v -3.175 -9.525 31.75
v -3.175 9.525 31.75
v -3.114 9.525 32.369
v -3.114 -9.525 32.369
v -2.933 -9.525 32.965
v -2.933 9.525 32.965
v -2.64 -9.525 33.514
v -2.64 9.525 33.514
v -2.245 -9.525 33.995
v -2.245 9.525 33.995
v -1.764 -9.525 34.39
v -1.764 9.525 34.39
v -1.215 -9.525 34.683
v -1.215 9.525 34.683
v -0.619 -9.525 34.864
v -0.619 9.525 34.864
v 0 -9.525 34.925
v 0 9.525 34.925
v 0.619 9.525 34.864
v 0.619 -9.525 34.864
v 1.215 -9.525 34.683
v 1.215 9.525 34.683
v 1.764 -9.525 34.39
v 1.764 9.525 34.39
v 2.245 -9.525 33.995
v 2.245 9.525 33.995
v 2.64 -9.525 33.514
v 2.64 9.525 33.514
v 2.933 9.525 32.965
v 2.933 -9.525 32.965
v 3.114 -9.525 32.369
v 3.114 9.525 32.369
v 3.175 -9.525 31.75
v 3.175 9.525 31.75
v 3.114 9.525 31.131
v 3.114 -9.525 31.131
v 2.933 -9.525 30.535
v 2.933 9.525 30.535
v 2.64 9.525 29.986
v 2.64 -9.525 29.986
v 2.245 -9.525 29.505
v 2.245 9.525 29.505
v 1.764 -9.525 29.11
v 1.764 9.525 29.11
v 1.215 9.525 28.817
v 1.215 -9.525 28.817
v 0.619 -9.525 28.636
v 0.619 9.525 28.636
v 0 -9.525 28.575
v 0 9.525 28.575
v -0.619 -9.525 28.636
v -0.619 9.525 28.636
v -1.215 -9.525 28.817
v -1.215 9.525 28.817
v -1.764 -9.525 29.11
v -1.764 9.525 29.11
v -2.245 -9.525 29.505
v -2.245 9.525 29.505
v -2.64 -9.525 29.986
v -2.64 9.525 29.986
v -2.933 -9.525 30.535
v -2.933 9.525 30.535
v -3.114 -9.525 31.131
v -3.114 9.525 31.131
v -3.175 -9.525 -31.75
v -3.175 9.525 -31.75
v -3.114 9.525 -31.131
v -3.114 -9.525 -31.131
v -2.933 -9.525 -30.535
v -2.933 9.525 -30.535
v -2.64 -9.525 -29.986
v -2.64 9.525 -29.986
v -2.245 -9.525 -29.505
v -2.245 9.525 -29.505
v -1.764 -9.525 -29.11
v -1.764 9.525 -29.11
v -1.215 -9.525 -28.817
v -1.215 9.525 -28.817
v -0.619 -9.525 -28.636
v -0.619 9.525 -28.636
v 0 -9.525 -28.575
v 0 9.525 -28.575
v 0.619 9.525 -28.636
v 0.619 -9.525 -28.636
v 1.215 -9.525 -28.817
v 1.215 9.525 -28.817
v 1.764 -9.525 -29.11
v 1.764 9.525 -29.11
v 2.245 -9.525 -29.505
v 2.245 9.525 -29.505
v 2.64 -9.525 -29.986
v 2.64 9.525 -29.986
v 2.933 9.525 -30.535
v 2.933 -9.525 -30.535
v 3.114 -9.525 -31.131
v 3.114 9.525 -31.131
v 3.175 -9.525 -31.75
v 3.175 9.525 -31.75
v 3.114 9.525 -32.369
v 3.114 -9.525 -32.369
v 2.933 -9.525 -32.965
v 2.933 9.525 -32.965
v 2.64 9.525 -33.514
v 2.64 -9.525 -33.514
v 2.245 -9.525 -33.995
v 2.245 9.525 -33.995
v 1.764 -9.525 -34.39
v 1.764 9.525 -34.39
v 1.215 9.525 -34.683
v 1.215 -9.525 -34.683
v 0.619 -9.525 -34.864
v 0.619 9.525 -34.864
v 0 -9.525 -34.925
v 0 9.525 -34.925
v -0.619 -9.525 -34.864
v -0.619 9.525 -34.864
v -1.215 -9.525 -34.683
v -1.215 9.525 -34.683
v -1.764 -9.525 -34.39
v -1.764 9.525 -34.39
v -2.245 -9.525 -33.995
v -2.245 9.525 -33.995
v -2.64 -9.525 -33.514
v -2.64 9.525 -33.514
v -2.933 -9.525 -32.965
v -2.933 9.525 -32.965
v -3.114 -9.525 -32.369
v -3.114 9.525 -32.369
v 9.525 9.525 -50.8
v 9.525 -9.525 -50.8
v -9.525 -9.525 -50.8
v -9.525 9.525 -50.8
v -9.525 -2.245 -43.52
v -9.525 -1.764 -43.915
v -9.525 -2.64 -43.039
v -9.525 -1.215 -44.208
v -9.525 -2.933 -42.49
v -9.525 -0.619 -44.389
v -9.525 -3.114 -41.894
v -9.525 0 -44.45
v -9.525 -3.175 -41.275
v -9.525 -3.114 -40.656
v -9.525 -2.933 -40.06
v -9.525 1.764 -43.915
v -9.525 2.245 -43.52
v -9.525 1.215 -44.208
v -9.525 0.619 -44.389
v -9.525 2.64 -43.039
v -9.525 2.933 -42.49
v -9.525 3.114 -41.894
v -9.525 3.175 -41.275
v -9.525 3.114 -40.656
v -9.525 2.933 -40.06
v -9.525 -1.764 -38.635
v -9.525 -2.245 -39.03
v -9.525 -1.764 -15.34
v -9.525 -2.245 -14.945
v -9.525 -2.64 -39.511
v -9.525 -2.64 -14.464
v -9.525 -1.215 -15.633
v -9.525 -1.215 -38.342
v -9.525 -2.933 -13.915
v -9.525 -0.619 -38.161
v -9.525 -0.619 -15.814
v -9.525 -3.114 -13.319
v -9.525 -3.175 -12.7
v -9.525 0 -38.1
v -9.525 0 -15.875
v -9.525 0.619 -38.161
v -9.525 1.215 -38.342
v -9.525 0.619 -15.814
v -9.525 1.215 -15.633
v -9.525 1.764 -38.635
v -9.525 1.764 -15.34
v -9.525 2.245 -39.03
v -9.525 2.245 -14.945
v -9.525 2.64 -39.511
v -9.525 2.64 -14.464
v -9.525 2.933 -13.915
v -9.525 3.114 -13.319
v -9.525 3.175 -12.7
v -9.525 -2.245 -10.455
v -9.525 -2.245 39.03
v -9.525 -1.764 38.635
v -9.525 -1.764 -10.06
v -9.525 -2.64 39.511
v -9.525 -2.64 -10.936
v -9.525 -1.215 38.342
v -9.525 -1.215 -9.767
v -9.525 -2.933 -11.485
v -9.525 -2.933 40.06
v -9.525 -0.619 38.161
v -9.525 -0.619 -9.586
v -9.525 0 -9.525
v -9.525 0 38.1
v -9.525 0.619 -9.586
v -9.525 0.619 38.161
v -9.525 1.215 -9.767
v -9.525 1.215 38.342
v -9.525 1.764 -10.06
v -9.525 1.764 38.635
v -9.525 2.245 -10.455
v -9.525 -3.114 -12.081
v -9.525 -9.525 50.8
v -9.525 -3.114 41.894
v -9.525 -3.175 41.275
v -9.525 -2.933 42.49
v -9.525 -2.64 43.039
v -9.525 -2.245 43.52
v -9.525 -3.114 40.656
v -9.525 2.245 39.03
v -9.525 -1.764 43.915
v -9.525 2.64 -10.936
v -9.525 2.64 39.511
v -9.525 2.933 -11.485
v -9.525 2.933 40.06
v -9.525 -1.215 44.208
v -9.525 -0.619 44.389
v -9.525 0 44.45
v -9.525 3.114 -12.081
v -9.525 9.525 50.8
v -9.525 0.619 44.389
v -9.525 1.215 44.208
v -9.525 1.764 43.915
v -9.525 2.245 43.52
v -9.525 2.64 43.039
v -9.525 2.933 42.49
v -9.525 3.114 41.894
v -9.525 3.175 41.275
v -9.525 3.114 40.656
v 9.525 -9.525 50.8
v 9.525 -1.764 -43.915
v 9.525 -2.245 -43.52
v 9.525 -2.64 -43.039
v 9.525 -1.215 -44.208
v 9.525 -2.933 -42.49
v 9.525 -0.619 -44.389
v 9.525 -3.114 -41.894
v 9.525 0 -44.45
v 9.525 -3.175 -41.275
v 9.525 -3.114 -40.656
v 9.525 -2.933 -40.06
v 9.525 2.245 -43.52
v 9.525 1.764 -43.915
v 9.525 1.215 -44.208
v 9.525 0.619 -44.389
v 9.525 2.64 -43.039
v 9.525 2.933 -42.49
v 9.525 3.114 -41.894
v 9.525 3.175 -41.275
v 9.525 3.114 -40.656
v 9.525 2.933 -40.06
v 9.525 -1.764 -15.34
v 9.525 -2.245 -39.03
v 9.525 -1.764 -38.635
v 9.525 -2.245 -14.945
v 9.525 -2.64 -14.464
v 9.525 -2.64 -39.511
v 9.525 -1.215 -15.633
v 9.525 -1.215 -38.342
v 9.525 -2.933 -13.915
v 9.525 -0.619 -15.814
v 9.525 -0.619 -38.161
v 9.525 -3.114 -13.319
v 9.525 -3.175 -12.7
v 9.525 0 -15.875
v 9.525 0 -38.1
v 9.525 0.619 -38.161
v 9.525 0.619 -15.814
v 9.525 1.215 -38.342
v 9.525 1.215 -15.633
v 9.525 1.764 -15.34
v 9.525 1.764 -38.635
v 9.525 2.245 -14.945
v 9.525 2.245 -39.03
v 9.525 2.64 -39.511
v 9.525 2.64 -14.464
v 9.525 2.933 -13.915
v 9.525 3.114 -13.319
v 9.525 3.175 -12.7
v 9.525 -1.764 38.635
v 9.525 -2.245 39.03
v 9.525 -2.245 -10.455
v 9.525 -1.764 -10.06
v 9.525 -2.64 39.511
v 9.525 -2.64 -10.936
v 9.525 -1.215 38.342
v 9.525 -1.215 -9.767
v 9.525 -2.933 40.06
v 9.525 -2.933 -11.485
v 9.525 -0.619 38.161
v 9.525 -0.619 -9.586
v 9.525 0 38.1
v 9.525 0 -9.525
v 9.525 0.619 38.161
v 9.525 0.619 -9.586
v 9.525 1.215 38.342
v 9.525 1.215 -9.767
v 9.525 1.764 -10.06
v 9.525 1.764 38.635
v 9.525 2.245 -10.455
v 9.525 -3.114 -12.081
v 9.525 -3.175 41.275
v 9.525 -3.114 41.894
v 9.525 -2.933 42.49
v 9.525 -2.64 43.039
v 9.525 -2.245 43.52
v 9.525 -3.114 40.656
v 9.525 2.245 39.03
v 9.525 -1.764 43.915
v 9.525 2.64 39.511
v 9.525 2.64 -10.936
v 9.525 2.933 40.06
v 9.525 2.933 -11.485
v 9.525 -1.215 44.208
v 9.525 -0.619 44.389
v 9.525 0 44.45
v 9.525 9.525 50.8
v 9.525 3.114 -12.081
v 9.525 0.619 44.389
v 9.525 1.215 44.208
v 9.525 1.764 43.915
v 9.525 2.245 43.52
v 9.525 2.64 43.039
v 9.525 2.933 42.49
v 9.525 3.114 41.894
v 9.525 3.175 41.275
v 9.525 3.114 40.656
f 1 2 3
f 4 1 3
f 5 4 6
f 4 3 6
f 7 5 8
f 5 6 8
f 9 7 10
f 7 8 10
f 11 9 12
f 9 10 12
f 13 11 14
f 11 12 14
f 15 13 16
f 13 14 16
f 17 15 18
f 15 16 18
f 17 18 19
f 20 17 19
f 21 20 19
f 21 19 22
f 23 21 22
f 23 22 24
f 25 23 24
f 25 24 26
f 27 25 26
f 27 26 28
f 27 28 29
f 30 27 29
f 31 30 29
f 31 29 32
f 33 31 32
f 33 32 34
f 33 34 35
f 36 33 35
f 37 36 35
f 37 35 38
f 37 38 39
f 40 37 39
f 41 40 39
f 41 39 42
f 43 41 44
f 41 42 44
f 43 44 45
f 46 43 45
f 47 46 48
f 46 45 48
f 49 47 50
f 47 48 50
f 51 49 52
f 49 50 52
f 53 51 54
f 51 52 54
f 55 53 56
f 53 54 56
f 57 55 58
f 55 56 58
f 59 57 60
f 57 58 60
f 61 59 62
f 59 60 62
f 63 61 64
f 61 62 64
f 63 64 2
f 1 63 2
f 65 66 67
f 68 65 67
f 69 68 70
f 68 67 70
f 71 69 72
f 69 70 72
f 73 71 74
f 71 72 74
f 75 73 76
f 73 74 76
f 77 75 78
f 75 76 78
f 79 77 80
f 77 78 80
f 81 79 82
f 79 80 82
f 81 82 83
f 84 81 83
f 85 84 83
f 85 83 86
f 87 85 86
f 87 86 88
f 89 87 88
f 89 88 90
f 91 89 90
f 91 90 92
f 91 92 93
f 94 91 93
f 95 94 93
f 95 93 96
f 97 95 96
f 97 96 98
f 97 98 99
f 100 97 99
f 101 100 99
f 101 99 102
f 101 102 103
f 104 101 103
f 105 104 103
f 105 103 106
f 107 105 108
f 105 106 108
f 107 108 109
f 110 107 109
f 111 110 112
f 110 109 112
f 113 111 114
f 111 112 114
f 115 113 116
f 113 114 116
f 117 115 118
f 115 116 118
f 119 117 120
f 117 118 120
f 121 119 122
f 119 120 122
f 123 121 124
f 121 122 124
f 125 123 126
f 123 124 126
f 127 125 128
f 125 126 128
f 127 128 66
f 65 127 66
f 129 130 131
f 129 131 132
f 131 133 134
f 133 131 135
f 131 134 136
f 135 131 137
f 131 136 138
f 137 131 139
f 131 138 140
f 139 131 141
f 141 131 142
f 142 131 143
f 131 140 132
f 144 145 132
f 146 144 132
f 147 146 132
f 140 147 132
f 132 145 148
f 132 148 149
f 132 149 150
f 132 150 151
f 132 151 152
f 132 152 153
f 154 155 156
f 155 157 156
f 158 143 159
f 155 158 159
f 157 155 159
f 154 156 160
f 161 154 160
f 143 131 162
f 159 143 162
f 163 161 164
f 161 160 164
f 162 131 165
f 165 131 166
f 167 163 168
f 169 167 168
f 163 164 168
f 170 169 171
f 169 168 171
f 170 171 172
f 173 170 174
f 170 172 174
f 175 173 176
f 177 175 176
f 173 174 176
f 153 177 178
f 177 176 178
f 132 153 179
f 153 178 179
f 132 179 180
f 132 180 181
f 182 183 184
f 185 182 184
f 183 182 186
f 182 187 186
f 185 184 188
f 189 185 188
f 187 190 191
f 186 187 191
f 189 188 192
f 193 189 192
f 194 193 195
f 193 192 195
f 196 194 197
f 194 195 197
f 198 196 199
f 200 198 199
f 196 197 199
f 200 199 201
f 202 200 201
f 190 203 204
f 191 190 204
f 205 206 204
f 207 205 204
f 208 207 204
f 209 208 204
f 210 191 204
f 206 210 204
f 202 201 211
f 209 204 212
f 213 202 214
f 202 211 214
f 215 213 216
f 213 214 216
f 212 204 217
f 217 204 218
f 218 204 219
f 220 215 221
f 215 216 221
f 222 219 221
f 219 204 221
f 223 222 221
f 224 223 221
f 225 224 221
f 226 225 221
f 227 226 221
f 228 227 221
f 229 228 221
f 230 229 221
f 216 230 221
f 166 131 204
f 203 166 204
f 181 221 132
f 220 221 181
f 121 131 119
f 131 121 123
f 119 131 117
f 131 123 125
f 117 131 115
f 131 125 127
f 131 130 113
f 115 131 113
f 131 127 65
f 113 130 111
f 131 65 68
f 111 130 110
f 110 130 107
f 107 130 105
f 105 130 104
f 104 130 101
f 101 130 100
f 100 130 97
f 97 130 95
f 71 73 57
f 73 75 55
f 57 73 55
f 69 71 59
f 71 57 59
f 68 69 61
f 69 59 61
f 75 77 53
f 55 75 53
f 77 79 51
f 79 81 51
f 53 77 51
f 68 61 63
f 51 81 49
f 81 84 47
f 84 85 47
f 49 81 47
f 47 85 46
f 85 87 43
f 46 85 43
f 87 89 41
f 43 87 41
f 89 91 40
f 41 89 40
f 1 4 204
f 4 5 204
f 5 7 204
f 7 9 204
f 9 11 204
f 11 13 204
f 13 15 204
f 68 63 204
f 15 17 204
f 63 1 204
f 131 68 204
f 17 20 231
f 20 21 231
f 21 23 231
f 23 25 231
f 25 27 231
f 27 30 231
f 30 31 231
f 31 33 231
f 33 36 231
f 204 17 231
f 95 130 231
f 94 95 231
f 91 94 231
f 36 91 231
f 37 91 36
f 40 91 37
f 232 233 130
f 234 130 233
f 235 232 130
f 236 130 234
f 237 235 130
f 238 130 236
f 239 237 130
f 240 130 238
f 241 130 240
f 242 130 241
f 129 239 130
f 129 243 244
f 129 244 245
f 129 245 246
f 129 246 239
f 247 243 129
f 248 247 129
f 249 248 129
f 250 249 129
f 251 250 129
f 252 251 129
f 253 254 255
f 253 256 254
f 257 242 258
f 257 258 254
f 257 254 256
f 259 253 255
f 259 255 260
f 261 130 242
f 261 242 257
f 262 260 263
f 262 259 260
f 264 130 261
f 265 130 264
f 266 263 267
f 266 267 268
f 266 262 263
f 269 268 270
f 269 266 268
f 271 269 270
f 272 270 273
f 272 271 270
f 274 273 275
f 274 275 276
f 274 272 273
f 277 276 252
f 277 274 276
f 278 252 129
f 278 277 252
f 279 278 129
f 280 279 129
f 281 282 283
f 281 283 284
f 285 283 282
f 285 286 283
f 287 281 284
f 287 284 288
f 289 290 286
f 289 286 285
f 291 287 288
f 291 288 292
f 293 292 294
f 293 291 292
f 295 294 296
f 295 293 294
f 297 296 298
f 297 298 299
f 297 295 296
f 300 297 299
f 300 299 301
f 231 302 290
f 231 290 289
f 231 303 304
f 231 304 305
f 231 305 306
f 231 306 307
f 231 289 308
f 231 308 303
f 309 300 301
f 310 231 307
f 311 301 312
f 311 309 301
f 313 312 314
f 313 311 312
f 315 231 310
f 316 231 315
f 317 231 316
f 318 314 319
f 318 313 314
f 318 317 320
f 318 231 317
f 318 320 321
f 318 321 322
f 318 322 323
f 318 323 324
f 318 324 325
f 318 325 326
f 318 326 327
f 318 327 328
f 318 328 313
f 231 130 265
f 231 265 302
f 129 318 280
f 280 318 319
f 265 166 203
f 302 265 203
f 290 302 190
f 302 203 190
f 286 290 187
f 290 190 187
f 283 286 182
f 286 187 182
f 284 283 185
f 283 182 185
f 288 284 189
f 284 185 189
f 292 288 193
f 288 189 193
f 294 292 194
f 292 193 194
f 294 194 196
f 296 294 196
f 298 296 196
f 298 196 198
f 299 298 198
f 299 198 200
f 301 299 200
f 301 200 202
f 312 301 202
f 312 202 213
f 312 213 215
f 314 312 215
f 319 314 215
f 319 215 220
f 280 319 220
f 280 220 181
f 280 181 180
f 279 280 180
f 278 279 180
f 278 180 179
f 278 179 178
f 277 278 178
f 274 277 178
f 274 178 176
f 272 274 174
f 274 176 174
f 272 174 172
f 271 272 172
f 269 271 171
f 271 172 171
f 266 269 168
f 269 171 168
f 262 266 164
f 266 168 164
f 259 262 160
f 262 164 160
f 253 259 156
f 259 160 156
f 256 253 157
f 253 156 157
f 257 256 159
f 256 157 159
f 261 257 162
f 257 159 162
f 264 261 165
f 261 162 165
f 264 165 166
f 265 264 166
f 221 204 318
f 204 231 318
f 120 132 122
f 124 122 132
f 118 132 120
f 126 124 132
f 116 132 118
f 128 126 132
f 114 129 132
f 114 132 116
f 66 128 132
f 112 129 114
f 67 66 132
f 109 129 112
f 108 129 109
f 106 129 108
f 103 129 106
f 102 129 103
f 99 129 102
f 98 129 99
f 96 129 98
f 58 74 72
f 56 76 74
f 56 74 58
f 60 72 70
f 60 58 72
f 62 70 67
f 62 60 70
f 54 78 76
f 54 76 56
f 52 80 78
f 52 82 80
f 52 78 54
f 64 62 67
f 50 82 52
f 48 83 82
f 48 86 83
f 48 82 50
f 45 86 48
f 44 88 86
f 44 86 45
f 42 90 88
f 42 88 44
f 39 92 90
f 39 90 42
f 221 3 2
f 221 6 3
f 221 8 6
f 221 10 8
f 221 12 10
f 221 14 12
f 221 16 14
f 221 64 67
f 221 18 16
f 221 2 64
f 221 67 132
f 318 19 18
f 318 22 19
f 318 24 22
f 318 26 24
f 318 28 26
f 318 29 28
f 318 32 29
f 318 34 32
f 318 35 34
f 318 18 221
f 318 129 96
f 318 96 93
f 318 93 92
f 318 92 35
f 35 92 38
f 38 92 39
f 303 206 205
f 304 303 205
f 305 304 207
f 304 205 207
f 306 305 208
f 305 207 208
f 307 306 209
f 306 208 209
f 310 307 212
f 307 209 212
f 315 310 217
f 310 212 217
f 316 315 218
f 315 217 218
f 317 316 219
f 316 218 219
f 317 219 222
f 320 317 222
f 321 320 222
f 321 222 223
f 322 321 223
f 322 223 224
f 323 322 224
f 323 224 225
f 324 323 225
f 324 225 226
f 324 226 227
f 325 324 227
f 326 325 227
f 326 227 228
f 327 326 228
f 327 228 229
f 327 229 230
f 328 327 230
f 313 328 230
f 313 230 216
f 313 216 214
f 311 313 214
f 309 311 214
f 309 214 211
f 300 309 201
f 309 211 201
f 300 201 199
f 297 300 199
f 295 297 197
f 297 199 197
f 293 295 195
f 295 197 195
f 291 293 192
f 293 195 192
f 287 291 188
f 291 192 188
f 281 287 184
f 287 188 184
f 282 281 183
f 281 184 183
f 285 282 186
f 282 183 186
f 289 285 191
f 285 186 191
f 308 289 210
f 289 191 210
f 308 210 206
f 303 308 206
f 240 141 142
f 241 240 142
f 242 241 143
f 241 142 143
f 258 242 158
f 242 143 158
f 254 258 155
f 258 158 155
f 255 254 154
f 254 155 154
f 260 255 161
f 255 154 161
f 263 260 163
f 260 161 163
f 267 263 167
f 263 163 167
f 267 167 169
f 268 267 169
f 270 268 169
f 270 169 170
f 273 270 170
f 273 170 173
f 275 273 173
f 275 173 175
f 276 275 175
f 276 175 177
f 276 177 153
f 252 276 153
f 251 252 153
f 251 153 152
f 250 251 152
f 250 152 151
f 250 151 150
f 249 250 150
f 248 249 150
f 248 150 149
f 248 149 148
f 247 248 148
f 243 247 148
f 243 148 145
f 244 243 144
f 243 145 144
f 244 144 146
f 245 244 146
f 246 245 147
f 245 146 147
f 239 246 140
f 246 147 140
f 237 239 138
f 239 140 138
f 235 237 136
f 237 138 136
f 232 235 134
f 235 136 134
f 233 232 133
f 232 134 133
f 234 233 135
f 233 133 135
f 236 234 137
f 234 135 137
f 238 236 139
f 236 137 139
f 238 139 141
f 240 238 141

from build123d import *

# Parameters (mm, degrees)
F0_W     = 19.05
F0_H     = 101.6
F1_DEPTH = 9.525
F3_D     = 6.35
F5_D     = 6.35
F7_D     = 6.35


with BuildPart() as f1:
    # F0 (on Right) → F1 (new body, symmetric)
    with BuildSketch(Plane.YZ):
        Rectangle(F0_W, F0_H)
    extrude(amount=F1_DEPTH, both=True)

    # F3 (through all)
    with Locations(Plane.XZ.offset(9.525)):
        with Locations((0, 31.75), (0, -31.75)):
            Hole(F3_D / 2)

    # F5 (through all)
    with Locations(Plane.YZ.offset(9.525)):
        with Locations((0, 41.275), (0, -41.275)):
            Hole(F5_D / 2)

    # F7 (through all)
    with Locations(Plane.YZ.offset(9.525)):
        with Locations((0, -12.7)):
            Hole(F7_D / 2)


solid = f1.part
